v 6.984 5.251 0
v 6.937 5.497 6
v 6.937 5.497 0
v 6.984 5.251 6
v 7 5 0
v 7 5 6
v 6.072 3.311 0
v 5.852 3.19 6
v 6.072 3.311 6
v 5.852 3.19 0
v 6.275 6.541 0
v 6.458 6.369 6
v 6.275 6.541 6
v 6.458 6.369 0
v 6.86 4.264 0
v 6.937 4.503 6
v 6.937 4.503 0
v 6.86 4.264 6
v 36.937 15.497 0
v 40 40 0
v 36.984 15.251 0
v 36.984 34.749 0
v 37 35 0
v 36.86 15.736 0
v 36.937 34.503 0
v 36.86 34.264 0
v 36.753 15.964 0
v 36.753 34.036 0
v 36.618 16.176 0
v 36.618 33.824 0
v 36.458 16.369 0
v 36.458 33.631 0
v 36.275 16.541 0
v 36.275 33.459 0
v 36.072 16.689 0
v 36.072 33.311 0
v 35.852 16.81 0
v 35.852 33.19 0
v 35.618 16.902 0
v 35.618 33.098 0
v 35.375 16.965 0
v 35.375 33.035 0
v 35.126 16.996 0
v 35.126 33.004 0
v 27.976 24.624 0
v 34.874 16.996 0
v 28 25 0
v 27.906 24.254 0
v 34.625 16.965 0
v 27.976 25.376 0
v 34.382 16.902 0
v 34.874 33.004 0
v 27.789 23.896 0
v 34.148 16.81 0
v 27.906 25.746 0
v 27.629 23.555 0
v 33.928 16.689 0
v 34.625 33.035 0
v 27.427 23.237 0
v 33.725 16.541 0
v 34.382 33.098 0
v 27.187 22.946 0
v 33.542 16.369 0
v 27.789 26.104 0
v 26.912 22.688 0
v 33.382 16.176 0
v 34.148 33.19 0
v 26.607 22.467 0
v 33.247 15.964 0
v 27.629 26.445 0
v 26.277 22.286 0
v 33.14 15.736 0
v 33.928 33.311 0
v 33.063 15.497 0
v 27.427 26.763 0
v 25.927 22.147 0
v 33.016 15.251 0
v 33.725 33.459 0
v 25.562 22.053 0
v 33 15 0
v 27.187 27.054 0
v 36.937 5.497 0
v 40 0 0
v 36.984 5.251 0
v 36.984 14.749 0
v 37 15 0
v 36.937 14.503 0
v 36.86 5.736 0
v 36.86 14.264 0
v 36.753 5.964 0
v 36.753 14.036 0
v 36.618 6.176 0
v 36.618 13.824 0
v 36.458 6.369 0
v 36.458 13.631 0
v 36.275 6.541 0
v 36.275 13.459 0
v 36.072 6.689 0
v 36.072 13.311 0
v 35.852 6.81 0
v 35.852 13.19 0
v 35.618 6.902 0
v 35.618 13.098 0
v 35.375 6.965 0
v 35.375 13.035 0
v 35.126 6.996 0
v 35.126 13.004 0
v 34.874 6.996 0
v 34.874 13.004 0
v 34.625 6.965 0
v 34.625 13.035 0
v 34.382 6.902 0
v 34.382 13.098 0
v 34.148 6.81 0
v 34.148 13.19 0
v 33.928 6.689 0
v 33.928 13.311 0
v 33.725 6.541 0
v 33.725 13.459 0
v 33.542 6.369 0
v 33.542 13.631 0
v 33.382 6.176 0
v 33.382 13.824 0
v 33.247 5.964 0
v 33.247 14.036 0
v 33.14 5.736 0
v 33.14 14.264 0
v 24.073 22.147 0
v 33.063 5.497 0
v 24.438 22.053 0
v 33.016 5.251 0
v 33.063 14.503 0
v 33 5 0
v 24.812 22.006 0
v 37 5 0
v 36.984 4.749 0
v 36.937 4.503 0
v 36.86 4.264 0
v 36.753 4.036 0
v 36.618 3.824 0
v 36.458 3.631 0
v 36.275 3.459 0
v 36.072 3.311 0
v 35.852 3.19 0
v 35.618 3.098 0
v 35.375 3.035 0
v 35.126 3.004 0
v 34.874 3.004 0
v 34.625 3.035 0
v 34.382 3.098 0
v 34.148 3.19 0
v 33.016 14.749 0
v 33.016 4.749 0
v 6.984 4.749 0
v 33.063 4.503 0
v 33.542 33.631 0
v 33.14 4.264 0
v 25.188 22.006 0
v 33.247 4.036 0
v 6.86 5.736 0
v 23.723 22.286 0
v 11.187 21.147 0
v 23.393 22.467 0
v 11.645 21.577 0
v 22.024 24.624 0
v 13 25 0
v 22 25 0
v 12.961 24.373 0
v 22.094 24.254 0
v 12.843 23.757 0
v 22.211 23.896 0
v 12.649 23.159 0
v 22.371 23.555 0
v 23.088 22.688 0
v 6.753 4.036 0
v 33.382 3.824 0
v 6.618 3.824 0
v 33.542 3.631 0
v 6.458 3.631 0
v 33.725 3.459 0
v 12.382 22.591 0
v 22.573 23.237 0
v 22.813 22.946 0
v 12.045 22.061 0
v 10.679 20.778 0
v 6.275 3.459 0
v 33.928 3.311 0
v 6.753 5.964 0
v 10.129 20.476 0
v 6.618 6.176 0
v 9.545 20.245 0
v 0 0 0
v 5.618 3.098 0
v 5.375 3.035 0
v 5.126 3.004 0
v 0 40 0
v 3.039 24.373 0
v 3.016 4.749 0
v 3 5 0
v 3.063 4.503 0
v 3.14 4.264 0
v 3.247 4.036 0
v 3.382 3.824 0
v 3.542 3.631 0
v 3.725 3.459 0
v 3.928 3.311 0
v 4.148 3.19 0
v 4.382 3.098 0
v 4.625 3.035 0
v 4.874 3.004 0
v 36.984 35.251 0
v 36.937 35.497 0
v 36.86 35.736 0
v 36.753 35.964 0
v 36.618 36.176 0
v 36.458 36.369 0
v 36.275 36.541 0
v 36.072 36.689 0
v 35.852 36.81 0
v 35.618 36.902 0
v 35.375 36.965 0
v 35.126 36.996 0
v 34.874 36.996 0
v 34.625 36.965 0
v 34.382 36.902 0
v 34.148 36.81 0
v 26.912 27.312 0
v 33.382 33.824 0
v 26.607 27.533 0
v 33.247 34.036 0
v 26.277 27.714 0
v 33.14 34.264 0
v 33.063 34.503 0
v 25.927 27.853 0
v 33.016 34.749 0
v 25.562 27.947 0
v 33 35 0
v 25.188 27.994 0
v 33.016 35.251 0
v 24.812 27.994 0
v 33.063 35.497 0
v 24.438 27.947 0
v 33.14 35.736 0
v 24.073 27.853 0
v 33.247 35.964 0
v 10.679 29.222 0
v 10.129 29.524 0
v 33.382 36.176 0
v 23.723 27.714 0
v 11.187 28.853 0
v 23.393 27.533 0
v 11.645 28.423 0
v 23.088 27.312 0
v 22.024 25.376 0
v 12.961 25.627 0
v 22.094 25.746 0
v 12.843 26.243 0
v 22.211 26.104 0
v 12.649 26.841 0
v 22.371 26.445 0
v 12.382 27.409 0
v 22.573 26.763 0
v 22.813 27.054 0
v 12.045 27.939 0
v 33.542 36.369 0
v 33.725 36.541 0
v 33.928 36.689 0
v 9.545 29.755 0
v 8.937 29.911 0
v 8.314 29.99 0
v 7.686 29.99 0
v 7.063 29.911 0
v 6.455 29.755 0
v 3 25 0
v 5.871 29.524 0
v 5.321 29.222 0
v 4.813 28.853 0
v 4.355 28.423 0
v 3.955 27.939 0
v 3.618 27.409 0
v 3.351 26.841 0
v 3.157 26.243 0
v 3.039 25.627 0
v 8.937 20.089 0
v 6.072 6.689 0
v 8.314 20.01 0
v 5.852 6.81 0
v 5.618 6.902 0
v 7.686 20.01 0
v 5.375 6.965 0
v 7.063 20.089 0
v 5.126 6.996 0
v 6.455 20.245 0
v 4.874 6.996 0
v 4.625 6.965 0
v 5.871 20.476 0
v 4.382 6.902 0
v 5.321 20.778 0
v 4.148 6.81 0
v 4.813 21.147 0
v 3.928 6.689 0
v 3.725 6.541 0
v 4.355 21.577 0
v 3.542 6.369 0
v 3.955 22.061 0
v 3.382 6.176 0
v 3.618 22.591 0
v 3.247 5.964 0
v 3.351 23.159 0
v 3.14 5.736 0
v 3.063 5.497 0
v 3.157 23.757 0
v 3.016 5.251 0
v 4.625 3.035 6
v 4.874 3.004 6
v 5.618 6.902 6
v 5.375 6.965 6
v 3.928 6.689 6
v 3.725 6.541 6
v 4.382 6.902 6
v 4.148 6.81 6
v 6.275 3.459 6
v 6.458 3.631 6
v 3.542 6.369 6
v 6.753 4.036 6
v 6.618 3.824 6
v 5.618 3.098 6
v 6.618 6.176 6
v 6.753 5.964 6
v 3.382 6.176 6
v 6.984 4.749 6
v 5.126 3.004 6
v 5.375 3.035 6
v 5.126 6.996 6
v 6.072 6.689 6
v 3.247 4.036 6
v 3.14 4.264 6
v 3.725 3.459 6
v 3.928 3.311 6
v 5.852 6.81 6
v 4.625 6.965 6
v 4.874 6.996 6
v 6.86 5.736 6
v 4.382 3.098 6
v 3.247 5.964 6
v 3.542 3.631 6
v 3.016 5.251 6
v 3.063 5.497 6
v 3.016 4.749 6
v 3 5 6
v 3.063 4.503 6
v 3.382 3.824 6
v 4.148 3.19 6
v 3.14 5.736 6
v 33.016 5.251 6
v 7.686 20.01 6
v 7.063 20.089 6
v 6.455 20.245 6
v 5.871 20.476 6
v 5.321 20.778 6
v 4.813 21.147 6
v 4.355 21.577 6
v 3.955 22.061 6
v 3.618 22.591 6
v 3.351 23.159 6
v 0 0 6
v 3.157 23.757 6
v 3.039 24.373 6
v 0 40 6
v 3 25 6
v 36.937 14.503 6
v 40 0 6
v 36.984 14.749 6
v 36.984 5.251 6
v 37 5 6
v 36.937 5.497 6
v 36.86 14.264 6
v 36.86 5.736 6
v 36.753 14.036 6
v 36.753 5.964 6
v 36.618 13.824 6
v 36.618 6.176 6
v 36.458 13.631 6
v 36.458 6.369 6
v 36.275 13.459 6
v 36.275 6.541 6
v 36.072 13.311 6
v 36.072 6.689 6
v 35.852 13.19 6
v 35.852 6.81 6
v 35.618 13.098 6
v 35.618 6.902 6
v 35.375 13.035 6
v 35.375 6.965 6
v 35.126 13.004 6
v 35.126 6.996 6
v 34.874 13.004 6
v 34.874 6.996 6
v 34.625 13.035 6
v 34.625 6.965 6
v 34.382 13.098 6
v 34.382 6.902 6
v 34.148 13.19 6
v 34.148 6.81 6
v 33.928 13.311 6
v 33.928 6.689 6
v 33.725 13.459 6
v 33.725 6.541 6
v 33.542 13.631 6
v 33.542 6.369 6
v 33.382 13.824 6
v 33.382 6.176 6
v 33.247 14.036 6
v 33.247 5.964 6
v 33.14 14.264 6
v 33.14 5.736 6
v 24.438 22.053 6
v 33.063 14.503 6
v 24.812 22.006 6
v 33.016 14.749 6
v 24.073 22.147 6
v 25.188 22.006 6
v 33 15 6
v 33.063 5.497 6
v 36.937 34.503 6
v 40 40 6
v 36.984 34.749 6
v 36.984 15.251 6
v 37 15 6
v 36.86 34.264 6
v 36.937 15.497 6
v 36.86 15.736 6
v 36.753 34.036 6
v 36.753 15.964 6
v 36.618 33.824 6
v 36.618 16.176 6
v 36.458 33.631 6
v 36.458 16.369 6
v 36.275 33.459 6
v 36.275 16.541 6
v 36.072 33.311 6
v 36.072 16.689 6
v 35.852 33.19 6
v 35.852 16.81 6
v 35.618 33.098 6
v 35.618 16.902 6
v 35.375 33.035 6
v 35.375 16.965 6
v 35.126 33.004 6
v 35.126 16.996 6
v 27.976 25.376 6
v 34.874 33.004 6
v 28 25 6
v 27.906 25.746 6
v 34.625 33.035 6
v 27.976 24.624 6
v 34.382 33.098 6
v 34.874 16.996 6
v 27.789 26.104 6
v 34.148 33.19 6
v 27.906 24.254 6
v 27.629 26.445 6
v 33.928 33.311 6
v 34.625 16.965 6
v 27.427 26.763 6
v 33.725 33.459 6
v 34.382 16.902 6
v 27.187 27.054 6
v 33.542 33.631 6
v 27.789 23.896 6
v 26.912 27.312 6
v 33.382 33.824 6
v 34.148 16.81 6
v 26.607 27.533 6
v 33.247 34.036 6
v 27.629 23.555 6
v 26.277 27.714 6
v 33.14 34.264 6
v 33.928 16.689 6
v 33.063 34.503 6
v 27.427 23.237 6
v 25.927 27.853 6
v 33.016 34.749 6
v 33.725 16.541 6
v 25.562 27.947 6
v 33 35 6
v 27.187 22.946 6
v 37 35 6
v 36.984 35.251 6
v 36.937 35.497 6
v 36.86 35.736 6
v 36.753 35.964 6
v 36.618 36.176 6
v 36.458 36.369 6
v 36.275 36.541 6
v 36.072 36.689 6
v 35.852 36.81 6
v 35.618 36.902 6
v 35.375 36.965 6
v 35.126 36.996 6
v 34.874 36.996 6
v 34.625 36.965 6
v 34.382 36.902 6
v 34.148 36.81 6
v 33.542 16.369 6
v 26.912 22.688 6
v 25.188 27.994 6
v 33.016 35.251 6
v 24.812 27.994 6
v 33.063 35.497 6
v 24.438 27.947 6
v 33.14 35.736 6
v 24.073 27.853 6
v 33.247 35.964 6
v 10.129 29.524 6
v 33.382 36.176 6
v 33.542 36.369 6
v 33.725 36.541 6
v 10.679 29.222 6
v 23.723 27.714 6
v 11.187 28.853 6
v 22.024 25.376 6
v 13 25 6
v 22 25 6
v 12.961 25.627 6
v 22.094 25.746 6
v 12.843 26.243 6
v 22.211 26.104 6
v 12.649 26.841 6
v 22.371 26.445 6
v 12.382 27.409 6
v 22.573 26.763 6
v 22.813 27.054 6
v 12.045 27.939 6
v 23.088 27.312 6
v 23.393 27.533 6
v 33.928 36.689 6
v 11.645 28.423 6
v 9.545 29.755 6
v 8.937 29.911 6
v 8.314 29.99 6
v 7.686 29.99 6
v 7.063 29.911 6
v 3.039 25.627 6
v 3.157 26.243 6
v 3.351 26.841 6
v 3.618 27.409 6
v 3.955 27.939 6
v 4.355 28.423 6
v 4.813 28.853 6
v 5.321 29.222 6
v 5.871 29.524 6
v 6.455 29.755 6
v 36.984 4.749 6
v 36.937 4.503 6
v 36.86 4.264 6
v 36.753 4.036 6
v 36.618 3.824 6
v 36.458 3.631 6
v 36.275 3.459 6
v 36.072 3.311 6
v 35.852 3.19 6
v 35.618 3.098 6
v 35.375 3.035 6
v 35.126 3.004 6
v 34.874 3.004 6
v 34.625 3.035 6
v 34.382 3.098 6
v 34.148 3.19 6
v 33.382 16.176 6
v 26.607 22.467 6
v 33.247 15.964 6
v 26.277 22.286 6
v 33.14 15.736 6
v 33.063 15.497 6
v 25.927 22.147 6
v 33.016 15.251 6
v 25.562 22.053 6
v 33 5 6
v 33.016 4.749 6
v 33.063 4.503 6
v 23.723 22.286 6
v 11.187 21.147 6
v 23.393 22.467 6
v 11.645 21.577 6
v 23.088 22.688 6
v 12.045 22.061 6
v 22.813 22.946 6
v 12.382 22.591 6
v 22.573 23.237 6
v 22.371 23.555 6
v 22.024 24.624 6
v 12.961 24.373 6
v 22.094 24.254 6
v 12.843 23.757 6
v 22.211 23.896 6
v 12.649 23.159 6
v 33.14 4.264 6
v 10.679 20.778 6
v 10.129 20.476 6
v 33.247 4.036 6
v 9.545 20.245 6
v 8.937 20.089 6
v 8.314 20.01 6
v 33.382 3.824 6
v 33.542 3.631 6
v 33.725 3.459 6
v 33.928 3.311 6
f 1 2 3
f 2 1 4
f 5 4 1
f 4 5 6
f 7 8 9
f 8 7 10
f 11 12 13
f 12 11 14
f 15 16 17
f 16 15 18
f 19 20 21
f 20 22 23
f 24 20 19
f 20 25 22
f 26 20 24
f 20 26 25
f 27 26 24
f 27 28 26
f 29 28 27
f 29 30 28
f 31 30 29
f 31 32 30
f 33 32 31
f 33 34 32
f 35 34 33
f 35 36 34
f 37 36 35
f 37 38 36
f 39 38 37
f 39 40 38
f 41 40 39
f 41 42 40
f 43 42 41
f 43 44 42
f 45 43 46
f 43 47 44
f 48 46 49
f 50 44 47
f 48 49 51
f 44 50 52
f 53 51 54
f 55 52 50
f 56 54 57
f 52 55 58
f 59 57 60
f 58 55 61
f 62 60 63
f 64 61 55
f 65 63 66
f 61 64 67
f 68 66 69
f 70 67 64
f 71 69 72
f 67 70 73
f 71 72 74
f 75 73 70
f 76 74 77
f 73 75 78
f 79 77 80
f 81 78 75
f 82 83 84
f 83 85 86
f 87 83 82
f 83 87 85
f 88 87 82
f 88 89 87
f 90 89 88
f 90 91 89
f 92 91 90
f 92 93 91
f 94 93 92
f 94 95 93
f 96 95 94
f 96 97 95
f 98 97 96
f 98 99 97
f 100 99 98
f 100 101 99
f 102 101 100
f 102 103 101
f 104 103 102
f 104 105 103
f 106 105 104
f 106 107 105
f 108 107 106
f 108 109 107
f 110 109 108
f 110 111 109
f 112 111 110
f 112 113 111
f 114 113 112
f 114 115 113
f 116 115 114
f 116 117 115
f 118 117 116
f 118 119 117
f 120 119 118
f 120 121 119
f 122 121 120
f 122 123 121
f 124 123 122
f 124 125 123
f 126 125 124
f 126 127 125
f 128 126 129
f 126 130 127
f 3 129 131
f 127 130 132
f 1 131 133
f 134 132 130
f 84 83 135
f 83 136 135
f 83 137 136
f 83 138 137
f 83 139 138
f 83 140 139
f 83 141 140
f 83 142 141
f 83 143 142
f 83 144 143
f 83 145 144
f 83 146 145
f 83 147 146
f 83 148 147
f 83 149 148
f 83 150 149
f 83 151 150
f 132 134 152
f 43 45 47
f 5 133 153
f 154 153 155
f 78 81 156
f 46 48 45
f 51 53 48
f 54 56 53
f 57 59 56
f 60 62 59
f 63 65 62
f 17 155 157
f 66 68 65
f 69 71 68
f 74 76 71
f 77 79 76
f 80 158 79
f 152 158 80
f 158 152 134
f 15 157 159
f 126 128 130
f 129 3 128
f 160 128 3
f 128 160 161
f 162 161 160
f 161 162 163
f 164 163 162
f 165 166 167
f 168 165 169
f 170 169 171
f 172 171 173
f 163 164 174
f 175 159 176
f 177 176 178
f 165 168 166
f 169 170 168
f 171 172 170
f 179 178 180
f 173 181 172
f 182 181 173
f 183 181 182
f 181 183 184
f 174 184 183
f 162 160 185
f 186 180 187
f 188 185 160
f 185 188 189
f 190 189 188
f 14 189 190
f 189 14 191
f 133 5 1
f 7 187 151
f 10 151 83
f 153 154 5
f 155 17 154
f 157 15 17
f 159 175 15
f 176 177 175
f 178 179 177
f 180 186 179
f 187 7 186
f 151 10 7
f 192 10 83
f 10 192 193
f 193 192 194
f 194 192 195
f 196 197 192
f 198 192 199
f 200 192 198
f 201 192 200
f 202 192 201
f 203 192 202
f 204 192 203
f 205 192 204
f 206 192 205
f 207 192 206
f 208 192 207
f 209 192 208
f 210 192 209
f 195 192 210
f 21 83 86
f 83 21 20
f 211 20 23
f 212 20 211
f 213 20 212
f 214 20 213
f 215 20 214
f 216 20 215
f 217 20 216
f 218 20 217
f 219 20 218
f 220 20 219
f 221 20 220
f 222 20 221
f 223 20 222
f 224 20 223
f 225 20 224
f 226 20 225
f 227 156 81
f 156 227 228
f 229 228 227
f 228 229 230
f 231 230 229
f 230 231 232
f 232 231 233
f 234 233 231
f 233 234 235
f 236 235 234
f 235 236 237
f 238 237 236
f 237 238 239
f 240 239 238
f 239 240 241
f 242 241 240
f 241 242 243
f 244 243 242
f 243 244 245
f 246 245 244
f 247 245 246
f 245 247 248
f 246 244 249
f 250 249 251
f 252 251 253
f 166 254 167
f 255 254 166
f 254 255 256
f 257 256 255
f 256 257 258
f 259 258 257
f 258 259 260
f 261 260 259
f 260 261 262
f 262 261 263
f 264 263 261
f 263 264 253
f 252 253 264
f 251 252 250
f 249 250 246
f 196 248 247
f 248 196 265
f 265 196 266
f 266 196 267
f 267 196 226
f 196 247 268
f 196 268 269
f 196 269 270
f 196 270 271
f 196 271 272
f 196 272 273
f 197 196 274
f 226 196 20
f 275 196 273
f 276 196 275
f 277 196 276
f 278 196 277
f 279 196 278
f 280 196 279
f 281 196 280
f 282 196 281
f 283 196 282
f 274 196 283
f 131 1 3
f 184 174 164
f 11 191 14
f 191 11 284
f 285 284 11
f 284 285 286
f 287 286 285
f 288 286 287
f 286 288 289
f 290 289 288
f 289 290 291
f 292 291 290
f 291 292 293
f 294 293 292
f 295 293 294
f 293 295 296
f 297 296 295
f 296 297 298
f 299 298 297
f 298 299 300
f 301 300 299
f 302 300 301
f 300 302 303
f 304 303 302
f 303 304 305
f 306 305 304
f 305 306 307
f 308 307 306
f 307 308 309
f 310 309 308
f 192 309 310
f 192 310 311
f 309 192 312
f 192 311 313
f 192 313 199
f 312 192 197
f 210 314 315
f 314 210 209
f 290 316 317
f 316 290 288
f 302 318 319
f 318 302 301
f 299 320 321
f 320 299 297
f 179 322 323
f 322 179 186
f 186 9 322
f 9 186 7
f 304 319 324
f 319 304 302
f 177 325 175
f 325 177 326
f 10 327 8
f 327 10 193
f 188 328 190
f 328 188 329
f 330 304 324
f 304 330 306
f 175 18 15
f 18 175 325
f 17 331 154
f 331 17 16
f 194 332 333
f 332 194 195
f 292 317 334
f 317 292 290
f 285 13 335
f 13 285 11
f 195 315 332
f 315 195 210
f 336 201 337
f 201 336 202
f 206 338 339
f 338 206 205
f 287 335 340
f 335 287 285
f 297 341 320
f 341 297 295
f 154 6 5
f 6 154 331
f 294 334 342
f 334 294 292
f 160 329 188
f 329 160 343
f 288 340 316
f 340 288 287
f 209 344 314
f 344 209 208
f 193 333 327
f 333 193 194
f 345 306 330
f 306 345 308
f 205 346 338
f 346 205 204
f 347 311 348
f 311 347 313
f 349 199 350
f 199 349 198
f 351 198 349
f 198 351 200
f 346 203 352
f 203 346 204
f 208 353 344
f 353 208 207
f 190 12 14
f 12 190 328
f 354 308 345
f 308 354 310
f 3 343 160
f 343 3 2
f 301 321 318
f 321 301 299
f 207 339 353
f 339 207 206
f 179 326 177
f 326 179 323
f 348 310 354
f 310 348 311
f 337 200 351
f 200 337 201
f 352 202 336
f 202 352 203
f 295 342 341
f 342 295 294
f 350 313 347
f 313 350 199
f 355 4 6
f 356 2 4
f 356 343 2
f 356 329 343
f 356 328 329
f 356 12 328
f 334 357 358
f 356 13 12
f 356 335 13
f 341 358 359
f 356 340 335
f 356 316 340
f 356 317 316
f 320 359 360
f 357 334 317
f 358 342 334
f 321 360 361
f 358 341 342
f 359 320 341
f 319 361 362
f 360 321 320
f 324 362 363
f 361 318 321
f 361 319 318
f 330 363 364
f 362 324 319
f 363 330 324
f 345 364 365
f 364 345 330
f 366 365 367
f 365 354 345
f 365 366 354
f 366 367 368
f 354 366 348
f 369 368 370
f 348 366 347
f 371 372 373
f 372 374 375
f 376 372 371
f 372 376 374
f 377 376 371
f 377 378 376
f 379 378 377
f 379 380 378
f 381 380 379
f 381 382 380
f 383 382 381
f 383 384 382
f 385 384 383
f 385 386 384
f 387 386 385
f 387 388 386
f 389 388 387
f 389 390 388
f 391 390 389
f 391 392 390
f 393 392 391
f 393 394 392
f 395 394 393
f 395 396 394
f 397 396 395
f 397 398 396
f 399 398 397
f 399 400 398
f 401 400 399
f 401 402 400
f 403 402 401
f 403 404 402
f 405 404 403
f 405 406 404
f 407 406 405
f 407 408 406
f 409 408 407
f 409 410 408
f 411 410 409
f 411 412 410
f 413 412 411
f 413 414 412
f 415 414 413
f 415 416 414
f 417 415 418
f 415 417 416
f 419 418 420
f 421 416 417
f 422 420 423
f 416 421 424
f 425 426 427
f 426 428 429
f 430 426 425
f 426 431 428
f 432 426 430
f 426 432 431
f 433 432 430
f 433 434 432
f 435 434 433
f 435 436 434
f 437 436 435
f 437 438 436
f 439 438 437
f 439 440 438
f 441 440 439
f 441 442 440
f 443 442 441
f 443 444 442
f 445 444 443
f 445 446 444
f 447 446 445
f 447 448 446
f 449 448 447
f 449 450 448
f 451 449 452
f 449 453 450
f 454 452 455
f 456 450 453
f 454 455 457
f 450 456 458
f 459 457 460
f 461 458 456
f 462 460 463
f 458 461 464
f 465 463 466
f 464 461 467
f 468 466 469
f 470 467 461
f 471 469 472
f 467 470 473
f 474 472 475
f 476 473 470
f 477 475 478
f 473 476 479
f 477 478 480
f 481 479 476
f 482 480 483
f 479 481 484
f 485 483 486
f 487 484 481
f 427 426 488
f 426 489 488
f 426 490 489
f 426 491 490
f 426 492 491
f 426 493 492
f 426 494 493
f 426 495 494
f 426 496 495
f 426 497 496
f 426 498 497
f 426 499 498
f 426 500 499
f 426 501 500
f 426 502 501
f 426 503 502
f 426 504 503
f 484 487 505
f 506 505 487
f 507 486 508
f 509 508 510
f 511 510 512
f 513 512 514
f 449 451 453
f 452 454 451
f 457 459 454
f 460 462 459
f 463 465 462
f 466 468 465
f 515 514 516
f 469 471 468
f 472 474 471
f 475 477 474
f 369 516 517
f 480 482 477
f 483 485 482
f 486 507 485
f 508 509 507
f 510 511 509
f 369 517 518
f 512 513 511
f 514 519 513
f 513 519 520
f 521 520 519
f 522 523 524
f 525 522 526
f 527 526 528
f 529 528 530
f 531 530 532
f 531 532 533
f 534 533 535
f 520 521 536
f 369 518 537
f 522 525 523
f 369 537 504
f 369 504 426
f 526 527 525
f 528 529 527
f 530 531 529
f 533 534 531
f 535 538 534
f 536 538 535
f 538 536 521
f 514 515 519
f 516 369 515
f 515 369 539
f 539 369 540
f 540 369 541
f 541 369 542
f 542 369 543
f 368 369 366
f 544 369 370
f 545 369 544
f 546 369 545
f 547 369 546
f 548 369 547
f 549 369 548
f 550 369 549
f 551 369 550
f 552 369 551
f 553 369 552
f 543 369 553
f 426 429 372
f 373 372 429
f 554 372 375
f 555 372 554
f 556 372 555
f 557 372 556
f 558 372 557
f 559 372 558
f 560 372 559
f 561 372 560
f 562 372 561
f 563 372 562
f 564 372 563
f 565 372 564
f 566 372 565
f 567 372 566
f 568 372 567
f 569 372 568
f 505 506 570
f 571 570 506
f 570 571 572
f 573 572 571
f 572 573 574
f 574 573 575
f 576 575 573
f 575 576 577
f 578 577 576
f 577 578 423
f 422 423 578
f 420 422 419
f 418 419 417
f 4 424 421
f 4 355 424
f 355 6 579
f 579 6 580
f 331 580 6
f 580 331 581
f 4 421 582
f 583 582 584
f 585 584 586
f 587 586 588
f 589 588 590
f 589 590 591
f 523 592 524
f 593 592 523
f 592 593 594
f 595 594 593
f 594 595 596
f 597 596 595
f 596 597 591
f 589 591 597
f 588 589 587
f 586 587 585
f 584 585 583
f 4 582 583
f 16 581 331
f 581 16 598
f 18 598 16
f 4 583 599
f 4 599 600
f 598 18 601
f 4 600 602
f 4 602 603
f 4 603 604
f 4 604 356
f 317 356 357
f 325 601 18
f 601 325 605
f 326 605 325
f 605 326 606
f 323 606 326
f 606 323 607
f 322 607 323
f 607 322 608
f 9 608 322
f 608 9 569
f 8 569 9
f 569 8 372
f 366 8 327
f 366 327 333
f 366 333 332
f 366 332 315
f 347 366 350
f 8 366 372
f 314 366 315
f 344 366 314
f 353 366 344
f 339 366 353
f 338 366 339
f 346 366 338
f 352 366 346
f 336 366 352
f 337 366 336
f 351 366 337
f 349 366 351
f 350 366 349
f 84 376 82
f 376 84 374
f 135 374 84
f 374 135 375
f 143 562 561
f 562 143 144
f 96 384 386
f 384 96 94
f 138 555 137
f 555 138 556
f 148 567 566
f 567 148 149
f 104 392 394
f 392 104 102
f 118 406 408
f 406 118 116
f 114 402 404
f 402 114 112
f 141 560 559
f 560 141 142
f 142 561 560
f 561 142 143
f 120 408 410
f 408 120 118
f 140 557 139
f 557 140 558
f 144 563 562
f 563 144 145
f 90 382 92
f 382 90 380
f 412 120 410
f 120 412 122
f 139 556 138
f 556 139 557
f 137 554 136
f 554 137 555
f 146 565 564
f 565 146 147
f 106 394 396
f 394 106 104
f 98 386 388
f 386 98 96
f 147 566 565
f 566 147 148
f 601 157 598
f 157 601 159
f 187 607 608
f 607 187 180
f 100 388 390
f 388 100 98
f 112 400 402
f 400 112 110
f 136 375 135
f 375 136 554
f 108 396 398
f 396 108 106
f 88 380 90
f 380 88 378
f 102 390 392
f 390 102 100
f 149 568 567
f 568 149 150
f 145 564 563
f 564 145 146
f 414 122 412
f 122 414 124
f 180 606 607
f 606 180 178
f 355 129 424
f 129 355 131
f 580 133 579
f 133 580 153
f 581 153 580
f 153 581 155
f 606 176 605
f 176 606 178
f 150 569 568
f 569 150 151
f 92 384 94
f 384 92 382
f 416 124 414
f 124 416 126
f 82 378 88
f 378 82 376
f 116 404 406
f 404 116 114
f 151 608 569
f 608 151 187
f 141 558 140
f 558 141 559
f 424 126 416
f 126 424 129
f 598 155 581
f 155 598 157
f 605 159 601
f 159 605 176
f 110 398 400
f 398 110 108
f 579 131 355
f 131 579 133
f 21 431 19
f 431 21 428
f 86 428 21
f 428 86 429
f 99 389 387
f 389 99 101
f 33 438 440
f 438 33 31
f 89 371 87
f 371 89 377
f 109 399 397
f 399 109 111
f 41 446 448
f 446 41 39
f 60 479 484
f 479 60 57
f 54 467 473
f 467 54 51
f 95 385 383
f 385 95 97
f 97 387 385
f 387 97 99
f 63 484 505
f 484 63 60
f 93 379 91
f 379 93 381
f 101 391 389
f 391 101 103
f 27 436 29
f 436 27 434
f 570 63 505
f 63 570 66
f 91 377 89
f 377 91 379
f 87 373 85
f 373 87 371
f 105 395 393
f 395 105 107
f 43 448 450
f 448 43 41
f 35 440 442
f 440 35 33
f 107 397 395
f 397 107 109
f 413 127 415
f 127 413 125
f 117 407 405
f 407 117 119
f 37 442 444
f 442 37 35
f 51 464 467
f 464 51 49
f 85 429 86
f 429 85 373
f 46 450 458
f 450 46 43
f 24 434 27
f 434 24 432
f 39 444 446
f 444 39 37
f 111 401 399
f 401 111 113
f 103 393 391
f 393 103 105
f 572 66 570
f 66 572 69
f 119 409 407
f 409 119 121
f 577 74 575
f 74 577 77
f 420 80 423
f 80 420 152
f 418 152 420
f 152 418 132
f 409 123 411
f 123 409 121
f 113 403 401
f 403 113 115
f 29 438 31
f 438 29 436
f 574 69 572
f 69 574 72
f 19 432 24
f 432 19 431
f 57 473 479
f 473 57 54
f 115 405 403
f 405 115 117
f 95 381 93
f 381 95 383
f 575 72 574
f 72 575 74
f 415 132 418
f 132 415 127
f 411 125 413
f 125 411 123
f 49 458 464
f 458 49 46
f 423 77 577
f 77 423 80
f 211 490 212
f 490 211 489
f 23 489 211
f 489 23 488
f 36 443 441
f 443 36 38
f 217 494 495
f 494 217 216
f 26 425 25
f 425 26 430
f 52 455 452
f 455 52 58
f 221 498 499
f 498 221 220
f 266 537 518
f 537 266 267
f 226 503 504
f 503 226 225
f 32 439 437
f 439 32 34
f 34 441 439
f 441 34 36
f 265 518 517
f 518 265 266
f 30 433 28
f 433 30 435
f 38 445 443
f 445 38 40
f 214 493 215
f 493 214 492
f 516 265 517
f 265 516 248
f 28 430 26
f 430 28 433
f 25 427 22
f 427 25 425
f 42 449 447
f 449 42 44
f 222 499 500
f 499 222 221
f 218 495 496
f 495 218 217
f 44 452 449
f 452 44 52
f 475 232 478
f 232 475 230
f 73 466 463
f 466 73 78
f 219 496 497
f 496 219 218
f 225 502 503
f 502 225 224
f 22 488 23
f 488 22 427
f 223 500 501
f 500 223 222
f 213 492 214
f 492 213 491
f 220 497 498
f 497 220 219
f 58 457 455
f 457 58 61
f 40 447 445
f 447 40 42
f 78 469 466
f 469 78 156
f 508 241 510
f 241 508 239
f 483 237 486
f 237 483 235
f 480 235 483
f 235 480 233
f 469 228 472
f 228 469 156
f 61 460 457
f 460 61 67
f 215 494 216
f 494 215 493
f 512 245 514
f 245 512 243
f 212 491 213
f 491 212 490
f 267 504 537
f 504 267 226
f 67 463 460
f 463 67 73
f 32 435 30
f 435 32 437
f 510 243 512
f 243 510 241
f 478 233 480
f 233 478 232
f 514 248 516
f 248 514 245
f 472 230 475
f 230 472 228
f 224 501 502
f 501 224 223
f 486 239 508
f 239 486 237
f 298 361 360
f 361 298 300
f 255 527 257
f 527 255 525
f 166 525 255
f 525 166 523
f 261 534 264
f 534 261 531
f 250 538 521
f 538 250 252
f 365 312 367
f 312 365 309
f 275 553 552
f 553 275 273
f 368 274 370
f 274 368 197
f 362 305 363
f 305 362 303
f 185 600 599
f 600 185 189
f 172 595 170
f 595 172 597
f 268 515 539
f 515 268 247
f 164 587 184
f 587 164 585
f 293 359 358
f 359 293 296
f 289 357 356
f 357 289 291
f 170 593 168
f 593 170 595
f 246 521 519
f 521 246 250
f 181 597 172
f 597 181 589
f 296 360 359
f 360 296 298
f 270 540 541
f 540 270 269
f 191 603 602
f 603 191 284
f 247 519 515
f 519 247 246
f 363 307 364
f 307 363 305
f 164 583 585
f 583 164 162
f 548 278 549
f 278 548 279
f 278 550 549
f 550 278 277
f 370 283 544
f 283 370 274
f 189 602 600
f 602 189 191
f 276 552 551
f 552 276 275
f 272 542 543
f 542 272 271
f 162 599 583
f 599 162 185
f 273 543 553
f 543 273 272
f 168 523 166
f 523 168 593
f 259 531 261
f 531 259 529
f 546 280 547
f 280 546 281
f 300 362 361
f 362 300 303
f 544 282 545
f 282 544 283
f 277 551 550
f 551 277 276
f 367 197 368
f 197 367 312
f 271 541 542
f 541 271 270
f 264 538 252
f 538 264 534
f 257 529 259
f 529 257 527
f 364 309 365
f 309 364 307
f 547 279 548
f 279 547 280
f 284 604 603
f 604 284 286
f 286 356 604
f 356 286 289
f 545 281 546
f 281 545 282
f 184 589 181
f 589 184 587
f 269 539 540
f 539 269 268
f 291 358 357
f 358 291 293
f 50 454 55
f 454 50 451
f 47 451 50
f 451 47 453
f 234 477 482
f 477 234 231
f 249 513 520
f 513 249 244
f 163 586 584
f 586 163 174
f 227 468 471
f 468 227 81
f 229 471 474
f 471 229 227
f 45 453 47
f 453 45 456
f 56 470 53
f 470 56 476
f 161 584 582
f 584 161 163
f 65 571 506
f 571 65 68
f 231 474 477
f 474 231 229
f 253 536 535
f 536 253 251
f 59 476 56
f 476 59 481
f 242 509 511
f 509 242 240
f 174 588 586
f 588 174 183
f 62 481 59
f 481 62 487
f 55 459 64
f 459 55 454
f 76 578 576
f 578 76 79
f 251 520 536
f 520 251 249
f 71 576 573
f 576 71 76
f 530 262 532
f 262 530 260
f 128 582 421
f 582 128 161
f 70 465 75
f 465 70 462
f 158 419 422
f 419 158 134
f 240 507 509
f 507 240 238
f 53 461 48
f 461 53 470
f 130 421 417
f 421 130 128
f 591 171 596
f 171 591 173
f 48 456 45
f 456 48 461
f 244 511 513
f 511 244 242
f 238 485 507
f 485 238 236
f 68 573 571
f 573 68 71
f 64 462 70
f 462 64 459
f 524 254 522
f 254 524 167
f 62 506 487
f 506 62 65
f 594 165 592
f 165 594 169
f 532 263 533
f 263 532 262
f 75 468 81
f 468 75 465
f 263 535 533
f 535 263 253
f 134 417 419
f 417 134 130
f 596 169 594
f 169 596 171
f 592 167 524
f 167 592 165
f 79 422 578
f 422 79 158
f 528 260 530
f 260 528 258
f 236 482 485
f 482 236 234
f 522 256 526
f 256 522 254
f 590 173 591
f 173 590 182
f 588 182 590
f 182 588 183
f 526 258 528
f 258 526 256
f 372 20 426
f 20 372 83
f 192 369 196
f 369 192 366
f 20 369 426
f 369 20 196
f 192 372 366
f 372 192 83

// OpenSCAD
$fn = 50;

mount_width = 40;
mount_length = 40;
material_thickness = 6;

mounting_screw_hole_radius = 2;
motor_hole_radius = 5;
hole_radius = 3;

difference(){
	cube([mount_width,mount_length,material_thickness]);

	union(){
		for (i = [[5,5,0],[35,5,0],[35,15,0],[35,35,0]]) {
			translate(i) cylinder (r=mounting_screw_hole_radius, h=material_thickness);
		}	
	
	translate ([8,25,0]) cylinder (r=motor_hole_radius, h=material_thickness);

	translate ([25,25,0]) cylinder (r=hole_radius, h=material_thickness);
	
	}
}
